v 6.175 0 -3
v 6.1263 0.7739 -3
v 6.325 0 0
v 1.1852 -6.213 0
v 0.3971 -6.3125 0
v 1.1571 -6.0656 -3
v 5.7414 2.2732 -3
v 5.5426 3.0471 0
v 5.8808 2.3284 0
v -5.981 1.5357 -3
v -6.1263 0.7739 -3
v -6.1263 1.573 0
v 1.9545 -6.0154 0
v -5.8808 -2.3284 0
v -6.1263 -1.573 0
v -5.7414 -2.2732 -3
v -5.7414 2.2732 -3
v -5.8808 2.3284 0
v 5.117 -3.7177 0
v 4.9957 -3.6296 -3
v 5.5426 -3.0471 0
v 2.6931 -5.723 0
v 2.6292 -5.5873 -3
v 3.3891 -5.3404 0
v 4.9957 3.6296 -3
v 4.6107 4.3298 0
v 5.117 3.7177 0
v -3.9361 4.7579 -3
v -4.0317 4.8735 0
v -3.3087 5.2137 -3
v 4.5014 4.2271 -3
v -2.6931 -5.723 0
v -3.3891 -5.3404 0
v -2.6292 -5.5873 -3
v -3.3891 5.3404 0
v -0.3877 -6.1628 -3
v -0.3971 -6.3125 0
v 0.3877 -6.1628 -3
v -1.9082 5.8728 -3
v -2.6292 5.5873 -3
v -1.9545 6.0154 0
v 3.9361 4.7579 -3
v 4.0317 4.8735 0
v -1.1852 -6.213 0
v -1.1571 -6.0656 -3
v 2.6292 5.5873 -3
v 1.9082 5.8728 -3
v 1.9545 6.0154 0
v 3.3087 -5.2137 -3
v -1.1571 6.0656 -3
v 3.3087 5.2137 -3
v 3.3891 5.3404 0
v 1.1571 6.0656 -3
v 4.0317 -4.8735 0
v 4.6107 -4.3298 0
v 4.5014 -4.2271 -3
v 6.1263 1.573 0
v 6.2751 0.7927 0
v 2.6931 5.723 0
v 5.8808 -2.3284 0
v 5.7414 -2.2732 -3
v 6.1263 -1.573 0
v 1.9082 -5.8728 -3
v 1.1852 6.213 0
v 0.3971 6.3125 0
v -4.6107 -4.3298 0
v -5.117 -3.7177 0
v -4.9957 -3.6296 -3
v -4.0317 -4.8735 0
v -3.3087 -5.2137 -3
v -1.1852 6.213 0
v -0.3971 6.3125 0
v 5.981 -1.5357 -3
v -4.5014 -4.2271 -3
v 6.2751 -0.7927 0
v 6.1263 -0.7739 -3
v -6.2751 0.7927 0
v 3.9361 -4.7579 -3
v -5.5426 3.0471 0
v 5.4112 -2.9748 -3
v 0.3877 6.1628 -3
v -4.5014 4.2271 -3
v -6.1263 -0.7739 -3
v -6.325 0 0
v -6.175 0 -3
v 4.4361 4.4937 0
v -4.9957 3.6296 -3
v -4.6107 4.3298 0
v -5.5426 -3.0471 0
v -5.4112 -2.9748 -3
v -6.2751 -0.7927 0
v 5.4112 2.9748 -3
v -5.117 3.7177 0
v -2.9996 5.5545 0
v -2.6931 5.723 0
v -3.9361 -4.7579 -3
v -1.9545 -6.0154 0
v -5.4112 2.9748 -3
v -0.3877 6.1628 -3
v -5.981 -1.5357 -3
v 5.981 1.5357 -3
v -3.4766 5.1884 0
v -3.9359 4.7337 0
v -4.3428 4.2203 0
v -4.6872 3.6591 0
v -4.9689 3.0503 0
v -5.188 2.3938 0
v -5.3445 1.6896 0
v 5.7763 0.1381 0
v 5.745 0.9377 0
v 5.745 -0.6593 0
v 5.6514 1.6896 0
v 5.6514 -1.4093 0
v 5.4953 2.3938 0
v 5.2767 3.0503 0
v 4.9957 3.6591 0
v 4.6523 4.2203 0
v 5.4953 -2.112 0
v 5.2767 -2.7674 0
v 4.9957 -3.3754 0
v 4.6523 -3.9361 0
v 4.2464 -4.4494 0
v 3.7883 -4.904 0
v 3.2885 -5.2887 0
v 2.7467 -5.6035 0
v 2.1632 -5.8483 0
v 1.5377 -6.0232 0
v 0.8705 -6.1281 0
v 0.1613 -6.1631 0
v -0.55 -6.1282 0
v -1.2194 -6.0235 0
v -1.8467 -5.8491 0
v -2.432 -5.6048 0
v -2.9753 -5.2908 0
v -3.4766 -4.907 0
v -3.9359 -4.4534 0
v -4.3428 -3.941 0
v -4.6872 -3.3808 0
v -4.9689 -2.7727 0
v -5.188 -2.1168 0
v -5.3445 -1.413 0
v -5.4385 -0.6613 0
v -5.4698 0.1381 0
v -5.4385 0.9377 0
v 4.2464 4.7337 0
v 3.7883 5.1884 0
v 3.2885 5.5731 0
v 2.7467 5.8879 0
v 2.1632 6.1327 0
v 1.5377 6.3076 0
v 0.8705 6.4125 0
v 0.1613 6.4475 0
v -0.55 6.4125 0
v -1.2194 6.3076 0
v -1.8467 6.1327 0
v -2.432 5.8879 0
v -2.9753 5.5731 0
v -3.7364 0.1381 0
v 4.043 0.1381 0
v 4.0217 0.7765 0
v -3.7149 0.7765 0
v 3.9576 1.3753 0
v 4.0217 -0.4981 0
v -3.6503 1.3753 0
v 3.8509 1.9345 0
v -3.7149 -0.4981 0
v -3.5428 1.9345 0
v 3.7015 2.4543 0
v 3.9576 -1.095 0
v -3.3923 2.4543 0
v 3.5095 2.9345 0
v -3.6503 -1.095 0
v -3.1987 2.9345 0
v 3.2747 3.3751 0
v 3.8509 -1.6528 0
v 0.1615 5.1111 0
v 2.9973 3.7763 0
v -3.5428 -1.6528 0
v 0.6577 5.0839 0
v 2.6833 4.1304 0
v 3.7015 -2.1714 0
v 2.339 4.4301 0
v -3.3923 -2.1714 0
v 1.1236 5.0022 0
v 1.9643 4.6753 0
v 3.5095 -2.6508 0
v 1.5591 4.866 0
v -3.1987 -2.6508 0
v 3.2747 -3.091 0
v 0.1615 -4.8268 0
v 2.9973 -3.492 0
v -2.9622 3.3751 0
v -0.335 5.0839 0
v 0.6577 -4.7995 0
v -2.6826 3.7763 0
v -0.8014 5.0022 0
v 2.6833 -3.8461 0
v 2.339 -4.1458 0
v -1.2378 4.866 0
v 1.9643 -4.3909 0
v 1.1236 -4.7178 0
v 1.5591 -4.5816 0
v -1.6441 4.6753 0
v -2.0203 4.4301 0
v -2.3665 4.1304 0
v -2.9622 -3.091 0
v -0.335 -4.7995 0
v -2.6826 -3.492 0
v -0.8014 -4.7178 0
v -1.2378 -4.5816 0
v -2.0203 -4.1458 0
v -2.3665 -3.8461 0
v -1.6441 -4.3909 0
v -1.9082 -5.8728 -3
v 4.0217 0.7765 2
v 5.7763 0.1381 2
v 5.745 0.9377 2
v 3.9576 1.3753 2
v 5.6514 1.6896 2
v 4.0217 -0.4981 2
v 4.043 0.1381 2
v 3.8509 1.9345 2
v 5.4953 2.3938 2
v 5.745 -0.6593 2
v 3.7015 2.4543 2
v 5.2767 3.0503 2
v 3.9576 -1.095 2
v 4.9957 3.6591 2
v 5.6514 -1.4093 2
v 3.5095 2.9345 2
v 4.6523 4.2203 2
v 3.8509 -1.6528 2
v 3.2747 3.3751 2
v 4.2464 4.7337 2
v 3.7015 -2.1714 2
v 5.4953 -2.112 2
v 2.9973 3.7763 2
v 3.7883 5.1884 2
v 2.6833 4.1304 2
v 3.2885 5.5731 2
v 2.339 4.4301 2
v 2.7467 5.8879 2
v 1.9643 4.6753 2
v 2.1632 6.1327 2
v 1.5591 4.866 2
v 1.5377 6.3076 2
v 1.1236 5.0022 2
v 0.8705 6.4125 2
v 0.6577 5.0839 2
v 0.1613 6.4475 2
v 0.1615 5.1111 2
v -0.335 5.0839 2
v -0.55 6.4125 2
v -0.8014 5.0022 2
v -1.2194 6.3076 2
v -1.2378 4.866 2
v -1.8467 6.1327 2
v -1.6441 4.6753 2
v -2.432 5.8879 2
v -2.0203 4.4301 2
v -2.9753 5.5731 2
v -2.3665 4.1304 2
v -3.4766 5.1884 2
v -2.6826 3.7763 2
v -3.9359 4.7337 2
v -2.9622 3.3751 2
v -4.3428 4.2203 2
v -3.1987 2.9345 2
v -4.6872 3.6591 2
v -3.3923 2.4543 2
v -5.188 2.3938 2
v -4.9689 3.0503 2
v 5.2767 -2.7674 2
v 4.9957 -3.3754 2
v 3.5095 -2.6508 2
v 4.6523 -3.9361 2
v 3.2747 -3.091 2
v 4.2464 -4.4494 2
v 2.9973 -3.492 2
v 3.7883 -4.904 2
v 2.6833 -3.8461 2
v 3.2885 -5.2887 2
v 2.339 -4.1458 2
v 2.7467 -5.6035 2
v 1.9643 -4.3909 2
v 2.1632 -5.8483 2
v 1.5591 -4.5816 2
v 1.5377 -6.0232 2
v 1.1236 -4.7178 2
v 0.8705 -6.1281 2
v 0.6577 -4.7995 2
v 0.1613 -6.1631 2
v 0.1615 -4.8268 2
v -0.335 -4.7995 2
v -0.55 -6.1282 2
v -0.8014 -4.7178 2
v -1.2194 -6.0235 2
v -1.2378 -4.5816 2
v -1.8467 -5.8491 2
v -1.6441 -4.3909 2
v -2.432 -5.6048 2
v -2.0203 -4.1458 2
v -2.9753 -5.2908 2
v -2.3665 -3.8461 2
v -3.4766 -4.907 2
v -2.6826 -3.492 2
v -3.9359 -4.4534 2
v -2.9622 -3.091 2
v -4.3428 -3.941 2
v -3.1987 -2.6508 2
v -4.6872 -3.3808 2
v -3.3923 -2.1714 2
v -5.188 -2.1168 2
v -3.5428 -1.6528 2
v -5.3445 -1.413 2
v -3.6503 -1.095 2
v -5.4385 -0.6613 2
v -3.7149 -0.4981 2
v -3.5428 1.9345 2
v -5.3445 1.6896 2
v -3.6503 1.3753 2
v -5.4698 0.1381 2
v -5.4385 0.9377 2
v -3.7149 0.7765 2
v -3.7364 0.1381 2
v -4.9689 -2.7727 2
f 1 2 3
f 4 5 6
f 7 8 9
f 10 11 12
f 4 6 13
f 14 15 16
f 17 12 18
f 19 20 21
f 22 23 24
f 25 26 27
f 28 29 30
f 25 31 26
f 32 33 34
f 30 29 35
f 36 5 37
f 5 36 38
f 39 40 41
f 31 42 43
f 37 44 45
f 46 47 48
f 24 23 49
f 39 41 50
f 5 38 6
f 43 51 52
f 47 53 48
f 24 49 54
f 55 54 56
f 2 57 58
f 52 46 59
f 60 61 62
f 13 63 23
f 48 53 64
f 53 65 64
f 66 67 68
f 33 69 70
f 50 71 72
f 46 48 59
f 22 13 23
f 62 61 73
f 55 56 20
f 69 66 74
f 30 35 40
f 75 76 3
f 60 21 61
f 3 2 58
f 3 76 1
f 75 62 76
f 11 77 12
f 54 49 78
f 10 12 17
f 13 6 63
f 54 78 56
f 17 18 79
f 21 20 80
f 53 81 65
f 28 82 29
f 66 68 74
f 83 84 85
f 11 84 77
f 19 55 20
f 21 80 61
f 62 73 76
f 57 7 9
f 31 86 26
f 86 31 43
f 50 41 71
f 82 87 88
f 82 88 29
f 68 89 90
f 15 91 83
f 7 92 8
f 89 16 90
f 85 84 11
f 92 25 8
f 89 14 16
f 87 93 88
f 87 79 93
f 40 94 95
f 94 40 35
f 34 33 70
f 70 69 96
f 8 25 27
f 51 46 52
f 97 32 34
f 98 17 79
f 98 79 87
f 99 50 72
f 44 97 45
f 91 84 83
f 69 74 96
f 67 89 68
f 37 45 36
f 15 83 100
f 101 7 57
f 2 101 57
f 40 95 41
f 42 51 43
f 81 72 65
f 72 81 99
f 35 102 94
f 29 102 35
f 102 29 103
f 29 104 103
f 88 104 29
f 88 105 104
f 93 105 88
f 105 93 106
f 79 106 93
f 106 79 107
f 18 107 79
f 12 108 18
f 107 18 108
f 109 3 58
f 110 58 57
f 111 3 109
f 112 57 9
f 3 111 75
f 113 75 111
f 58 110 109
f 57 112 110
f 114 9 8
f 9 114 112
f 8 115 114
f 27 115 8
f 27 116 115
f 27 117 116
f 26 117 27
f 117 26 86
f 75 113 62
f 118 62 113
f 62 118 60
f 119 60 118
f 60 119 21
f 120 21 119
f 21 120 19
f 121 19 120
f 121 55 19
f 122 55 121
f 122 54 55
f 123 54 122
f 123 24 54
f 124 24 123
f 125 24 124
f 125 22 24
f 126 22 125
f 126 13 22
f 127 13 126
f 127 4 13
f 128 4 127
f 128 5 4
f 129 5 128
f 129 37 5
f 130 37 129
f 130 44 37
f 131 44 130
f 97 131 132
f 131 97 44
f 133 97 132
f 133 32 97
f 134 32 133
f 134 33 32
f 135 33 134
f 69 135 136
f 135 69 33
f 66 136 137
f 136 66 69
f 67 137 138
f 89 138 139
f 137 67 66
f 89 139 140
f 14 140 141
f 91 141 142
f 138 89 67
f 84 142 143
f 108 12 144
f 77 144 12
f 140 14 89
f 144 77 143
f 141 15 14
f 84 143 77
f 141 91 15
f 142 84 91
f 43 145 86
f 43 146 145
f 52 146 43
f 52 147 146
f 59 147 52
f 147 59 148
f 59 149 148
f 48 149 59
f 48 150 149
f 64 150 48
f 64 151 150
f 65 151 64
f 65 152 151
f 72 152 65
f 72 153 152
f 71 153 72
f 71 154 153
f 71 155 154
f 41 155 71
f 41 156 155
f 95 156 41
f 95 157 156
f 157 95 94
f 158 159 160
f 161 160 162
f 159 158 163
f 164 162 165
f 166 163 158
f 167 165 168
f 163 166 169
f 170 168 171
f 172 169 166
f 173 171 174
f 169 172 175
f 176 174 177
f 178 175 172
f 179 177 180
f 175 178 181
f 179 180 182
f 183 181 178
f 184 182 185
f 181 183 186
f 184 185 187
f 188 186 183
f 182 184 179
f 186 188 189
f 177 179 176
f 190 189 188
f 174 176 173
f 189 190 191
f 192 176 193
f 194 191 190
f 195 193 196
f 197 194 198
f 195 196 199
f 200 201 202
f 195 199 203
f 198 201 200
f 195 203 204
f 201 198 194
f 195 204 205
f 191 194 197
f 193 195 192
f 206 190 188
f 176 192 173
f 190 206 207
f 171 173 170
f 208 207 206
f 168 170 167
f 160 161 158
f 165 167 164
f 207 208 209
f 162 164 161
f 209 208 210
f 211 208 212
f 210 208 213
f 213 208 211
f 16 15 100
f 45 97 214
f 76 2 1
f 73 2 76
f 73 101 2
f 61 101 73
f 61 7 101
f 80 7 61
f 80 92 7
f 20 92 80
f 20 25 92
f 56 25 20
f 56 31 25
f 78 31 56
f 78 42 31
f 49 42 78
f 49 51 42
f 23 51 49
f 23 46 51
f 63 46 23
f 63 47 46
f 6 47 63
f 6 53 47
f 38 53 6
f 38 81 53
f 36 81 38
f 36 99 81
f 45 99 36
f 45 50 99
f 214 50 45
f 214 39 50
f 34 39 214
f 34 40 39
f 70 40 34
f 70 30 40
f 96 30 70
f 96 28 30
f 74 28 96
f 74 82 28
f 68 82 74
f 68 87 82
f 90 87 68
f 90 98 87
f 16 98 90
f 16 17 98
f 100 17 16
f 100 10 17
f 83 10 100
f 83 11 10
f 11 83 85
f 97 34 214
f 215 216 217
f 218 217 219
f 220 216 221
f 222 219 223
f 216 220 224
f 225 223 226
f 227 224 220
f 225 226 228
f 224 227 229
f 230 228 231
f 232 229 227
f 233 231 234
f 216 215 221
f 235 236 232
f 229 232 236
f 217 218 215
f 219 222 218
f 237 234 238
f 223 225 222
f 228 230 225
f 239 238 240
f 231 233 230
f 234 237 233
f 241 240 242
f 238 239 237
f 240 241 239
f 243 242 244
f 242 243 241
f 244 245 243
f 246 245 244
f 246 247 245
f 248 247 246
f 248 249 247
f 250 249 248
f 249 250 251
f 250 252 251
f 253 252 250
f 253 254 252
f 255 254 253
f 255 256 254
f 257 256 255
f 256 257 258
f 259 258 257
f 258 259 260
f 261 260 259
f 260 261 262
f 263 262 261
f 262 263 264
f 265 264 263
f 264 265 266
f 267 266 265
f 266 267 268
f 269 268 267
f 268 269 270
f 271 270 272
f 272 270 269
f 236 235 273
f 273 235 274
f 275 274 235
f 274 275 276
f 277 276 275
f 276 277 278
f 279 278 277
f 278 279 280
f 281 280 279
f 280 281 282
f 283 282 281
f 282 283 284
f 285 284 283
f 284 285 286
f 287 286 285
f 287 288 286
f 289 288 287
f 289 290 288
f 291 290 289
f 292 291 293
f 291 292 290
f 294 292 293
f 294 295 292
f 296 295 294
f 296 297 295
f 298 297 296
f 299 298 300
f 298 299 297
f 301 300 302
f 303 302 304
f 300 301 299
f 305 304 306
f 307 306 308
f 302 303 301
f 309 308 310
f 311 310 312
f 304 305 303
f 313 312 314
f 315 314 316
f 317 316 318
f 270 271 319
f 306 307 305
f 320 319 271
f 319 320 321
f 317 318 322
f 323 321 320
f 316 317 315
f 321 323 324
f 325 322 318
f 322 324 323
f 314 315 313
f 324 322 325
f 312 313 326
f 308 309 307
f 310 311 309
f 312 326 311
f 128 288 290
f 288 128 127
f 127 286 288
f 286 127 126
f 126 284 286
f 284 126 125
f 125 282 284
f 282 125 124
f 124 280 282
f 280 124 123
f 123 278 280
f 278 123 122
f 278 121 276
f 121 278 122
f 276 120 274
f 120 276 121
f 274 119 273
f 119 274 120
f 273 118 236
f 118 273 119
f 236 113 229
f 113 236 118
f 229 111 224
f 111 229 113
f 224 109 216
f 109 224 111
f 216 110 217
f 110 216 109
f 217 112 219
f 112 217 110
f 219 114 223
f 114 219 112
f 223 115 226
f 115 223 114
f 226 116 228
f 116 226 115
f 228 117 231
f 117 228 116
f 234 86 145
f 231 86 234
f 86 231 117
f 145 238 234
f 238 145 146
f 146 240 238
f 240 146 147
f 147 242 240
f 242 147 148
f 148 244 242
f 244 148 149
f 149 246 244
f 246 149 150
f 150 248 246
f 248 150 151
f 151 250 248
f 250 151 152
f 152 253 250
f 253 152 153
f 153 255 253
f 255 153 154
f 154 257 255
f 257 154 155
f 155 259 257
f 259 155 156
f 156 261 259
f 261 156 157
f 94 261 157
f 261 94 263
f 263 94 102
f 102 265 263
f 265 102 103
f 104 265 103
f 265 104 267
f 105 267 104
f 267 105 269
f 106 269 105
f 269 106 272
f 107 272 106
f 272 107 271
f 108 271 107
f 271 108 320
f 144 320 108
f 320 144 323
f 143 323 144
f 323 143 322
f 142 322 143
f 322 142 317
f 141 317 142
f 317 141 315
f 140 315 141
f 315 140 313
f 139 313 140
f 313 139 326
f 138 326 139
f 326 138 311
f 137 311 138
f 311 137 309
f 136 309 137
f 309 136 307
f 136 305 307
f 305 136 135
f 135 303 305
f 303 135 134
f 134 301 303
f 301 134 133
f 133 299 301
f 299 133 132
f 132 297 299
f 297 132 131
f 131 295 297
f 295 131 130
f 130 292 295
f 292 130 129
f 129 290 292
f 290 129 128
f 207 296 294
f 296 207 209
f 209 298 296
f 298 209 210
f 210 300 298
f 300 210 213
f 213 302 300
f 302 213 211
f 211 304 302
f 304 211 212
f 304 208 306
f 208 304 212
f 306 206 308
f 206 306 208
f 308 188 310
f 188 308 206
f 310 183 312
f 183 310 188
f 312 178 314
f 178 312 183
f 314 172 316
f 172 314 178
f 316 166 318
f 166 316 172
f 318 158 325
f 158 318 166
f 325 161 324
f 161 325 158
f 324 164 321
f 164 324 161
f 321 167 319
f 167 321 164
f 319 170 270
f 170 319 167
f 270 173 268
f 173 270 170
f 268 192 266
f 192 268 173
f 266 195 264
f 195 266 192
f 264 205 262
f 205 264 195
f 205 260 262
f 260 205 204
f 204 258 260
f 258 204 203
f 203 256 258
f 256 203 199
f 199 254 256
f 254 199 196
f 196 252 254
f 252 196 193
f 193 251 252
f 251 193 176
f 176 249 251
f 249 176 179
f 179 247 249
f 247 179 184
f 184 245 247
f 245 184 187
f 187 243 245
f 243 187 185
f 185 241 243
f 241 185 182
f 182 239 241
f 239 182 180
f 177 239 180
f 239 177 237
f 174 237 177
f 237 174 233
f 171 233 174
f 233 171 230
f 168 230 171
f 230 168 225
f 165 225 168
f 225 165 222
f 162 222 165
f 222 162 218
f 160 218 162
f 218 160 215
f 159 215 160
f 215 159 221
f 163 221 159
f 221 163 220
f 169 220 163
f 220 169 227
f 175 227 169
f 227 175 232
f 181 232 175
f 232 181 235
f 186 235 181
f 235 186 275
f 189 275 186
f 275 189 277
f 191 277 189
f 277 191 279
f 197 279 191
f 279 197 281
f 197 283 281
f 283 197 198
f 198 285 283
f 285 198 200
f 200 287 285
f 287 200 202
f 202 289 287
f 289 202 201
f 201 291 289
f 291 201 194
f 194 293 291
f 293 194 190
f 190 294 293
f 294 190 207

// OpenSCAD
$fn = 50;

difference() {
	union() {
		translate(v = [0, 0, -3.0]) {
			cylinder(h = 3, r1 = 6.175, r2 = 6.325);
		}
		linear_extrude(height = 2) {
			text(font = "Impact", halign = "center", size = 12, text = "O", valign = "center");
		}
	}
	union();
}
